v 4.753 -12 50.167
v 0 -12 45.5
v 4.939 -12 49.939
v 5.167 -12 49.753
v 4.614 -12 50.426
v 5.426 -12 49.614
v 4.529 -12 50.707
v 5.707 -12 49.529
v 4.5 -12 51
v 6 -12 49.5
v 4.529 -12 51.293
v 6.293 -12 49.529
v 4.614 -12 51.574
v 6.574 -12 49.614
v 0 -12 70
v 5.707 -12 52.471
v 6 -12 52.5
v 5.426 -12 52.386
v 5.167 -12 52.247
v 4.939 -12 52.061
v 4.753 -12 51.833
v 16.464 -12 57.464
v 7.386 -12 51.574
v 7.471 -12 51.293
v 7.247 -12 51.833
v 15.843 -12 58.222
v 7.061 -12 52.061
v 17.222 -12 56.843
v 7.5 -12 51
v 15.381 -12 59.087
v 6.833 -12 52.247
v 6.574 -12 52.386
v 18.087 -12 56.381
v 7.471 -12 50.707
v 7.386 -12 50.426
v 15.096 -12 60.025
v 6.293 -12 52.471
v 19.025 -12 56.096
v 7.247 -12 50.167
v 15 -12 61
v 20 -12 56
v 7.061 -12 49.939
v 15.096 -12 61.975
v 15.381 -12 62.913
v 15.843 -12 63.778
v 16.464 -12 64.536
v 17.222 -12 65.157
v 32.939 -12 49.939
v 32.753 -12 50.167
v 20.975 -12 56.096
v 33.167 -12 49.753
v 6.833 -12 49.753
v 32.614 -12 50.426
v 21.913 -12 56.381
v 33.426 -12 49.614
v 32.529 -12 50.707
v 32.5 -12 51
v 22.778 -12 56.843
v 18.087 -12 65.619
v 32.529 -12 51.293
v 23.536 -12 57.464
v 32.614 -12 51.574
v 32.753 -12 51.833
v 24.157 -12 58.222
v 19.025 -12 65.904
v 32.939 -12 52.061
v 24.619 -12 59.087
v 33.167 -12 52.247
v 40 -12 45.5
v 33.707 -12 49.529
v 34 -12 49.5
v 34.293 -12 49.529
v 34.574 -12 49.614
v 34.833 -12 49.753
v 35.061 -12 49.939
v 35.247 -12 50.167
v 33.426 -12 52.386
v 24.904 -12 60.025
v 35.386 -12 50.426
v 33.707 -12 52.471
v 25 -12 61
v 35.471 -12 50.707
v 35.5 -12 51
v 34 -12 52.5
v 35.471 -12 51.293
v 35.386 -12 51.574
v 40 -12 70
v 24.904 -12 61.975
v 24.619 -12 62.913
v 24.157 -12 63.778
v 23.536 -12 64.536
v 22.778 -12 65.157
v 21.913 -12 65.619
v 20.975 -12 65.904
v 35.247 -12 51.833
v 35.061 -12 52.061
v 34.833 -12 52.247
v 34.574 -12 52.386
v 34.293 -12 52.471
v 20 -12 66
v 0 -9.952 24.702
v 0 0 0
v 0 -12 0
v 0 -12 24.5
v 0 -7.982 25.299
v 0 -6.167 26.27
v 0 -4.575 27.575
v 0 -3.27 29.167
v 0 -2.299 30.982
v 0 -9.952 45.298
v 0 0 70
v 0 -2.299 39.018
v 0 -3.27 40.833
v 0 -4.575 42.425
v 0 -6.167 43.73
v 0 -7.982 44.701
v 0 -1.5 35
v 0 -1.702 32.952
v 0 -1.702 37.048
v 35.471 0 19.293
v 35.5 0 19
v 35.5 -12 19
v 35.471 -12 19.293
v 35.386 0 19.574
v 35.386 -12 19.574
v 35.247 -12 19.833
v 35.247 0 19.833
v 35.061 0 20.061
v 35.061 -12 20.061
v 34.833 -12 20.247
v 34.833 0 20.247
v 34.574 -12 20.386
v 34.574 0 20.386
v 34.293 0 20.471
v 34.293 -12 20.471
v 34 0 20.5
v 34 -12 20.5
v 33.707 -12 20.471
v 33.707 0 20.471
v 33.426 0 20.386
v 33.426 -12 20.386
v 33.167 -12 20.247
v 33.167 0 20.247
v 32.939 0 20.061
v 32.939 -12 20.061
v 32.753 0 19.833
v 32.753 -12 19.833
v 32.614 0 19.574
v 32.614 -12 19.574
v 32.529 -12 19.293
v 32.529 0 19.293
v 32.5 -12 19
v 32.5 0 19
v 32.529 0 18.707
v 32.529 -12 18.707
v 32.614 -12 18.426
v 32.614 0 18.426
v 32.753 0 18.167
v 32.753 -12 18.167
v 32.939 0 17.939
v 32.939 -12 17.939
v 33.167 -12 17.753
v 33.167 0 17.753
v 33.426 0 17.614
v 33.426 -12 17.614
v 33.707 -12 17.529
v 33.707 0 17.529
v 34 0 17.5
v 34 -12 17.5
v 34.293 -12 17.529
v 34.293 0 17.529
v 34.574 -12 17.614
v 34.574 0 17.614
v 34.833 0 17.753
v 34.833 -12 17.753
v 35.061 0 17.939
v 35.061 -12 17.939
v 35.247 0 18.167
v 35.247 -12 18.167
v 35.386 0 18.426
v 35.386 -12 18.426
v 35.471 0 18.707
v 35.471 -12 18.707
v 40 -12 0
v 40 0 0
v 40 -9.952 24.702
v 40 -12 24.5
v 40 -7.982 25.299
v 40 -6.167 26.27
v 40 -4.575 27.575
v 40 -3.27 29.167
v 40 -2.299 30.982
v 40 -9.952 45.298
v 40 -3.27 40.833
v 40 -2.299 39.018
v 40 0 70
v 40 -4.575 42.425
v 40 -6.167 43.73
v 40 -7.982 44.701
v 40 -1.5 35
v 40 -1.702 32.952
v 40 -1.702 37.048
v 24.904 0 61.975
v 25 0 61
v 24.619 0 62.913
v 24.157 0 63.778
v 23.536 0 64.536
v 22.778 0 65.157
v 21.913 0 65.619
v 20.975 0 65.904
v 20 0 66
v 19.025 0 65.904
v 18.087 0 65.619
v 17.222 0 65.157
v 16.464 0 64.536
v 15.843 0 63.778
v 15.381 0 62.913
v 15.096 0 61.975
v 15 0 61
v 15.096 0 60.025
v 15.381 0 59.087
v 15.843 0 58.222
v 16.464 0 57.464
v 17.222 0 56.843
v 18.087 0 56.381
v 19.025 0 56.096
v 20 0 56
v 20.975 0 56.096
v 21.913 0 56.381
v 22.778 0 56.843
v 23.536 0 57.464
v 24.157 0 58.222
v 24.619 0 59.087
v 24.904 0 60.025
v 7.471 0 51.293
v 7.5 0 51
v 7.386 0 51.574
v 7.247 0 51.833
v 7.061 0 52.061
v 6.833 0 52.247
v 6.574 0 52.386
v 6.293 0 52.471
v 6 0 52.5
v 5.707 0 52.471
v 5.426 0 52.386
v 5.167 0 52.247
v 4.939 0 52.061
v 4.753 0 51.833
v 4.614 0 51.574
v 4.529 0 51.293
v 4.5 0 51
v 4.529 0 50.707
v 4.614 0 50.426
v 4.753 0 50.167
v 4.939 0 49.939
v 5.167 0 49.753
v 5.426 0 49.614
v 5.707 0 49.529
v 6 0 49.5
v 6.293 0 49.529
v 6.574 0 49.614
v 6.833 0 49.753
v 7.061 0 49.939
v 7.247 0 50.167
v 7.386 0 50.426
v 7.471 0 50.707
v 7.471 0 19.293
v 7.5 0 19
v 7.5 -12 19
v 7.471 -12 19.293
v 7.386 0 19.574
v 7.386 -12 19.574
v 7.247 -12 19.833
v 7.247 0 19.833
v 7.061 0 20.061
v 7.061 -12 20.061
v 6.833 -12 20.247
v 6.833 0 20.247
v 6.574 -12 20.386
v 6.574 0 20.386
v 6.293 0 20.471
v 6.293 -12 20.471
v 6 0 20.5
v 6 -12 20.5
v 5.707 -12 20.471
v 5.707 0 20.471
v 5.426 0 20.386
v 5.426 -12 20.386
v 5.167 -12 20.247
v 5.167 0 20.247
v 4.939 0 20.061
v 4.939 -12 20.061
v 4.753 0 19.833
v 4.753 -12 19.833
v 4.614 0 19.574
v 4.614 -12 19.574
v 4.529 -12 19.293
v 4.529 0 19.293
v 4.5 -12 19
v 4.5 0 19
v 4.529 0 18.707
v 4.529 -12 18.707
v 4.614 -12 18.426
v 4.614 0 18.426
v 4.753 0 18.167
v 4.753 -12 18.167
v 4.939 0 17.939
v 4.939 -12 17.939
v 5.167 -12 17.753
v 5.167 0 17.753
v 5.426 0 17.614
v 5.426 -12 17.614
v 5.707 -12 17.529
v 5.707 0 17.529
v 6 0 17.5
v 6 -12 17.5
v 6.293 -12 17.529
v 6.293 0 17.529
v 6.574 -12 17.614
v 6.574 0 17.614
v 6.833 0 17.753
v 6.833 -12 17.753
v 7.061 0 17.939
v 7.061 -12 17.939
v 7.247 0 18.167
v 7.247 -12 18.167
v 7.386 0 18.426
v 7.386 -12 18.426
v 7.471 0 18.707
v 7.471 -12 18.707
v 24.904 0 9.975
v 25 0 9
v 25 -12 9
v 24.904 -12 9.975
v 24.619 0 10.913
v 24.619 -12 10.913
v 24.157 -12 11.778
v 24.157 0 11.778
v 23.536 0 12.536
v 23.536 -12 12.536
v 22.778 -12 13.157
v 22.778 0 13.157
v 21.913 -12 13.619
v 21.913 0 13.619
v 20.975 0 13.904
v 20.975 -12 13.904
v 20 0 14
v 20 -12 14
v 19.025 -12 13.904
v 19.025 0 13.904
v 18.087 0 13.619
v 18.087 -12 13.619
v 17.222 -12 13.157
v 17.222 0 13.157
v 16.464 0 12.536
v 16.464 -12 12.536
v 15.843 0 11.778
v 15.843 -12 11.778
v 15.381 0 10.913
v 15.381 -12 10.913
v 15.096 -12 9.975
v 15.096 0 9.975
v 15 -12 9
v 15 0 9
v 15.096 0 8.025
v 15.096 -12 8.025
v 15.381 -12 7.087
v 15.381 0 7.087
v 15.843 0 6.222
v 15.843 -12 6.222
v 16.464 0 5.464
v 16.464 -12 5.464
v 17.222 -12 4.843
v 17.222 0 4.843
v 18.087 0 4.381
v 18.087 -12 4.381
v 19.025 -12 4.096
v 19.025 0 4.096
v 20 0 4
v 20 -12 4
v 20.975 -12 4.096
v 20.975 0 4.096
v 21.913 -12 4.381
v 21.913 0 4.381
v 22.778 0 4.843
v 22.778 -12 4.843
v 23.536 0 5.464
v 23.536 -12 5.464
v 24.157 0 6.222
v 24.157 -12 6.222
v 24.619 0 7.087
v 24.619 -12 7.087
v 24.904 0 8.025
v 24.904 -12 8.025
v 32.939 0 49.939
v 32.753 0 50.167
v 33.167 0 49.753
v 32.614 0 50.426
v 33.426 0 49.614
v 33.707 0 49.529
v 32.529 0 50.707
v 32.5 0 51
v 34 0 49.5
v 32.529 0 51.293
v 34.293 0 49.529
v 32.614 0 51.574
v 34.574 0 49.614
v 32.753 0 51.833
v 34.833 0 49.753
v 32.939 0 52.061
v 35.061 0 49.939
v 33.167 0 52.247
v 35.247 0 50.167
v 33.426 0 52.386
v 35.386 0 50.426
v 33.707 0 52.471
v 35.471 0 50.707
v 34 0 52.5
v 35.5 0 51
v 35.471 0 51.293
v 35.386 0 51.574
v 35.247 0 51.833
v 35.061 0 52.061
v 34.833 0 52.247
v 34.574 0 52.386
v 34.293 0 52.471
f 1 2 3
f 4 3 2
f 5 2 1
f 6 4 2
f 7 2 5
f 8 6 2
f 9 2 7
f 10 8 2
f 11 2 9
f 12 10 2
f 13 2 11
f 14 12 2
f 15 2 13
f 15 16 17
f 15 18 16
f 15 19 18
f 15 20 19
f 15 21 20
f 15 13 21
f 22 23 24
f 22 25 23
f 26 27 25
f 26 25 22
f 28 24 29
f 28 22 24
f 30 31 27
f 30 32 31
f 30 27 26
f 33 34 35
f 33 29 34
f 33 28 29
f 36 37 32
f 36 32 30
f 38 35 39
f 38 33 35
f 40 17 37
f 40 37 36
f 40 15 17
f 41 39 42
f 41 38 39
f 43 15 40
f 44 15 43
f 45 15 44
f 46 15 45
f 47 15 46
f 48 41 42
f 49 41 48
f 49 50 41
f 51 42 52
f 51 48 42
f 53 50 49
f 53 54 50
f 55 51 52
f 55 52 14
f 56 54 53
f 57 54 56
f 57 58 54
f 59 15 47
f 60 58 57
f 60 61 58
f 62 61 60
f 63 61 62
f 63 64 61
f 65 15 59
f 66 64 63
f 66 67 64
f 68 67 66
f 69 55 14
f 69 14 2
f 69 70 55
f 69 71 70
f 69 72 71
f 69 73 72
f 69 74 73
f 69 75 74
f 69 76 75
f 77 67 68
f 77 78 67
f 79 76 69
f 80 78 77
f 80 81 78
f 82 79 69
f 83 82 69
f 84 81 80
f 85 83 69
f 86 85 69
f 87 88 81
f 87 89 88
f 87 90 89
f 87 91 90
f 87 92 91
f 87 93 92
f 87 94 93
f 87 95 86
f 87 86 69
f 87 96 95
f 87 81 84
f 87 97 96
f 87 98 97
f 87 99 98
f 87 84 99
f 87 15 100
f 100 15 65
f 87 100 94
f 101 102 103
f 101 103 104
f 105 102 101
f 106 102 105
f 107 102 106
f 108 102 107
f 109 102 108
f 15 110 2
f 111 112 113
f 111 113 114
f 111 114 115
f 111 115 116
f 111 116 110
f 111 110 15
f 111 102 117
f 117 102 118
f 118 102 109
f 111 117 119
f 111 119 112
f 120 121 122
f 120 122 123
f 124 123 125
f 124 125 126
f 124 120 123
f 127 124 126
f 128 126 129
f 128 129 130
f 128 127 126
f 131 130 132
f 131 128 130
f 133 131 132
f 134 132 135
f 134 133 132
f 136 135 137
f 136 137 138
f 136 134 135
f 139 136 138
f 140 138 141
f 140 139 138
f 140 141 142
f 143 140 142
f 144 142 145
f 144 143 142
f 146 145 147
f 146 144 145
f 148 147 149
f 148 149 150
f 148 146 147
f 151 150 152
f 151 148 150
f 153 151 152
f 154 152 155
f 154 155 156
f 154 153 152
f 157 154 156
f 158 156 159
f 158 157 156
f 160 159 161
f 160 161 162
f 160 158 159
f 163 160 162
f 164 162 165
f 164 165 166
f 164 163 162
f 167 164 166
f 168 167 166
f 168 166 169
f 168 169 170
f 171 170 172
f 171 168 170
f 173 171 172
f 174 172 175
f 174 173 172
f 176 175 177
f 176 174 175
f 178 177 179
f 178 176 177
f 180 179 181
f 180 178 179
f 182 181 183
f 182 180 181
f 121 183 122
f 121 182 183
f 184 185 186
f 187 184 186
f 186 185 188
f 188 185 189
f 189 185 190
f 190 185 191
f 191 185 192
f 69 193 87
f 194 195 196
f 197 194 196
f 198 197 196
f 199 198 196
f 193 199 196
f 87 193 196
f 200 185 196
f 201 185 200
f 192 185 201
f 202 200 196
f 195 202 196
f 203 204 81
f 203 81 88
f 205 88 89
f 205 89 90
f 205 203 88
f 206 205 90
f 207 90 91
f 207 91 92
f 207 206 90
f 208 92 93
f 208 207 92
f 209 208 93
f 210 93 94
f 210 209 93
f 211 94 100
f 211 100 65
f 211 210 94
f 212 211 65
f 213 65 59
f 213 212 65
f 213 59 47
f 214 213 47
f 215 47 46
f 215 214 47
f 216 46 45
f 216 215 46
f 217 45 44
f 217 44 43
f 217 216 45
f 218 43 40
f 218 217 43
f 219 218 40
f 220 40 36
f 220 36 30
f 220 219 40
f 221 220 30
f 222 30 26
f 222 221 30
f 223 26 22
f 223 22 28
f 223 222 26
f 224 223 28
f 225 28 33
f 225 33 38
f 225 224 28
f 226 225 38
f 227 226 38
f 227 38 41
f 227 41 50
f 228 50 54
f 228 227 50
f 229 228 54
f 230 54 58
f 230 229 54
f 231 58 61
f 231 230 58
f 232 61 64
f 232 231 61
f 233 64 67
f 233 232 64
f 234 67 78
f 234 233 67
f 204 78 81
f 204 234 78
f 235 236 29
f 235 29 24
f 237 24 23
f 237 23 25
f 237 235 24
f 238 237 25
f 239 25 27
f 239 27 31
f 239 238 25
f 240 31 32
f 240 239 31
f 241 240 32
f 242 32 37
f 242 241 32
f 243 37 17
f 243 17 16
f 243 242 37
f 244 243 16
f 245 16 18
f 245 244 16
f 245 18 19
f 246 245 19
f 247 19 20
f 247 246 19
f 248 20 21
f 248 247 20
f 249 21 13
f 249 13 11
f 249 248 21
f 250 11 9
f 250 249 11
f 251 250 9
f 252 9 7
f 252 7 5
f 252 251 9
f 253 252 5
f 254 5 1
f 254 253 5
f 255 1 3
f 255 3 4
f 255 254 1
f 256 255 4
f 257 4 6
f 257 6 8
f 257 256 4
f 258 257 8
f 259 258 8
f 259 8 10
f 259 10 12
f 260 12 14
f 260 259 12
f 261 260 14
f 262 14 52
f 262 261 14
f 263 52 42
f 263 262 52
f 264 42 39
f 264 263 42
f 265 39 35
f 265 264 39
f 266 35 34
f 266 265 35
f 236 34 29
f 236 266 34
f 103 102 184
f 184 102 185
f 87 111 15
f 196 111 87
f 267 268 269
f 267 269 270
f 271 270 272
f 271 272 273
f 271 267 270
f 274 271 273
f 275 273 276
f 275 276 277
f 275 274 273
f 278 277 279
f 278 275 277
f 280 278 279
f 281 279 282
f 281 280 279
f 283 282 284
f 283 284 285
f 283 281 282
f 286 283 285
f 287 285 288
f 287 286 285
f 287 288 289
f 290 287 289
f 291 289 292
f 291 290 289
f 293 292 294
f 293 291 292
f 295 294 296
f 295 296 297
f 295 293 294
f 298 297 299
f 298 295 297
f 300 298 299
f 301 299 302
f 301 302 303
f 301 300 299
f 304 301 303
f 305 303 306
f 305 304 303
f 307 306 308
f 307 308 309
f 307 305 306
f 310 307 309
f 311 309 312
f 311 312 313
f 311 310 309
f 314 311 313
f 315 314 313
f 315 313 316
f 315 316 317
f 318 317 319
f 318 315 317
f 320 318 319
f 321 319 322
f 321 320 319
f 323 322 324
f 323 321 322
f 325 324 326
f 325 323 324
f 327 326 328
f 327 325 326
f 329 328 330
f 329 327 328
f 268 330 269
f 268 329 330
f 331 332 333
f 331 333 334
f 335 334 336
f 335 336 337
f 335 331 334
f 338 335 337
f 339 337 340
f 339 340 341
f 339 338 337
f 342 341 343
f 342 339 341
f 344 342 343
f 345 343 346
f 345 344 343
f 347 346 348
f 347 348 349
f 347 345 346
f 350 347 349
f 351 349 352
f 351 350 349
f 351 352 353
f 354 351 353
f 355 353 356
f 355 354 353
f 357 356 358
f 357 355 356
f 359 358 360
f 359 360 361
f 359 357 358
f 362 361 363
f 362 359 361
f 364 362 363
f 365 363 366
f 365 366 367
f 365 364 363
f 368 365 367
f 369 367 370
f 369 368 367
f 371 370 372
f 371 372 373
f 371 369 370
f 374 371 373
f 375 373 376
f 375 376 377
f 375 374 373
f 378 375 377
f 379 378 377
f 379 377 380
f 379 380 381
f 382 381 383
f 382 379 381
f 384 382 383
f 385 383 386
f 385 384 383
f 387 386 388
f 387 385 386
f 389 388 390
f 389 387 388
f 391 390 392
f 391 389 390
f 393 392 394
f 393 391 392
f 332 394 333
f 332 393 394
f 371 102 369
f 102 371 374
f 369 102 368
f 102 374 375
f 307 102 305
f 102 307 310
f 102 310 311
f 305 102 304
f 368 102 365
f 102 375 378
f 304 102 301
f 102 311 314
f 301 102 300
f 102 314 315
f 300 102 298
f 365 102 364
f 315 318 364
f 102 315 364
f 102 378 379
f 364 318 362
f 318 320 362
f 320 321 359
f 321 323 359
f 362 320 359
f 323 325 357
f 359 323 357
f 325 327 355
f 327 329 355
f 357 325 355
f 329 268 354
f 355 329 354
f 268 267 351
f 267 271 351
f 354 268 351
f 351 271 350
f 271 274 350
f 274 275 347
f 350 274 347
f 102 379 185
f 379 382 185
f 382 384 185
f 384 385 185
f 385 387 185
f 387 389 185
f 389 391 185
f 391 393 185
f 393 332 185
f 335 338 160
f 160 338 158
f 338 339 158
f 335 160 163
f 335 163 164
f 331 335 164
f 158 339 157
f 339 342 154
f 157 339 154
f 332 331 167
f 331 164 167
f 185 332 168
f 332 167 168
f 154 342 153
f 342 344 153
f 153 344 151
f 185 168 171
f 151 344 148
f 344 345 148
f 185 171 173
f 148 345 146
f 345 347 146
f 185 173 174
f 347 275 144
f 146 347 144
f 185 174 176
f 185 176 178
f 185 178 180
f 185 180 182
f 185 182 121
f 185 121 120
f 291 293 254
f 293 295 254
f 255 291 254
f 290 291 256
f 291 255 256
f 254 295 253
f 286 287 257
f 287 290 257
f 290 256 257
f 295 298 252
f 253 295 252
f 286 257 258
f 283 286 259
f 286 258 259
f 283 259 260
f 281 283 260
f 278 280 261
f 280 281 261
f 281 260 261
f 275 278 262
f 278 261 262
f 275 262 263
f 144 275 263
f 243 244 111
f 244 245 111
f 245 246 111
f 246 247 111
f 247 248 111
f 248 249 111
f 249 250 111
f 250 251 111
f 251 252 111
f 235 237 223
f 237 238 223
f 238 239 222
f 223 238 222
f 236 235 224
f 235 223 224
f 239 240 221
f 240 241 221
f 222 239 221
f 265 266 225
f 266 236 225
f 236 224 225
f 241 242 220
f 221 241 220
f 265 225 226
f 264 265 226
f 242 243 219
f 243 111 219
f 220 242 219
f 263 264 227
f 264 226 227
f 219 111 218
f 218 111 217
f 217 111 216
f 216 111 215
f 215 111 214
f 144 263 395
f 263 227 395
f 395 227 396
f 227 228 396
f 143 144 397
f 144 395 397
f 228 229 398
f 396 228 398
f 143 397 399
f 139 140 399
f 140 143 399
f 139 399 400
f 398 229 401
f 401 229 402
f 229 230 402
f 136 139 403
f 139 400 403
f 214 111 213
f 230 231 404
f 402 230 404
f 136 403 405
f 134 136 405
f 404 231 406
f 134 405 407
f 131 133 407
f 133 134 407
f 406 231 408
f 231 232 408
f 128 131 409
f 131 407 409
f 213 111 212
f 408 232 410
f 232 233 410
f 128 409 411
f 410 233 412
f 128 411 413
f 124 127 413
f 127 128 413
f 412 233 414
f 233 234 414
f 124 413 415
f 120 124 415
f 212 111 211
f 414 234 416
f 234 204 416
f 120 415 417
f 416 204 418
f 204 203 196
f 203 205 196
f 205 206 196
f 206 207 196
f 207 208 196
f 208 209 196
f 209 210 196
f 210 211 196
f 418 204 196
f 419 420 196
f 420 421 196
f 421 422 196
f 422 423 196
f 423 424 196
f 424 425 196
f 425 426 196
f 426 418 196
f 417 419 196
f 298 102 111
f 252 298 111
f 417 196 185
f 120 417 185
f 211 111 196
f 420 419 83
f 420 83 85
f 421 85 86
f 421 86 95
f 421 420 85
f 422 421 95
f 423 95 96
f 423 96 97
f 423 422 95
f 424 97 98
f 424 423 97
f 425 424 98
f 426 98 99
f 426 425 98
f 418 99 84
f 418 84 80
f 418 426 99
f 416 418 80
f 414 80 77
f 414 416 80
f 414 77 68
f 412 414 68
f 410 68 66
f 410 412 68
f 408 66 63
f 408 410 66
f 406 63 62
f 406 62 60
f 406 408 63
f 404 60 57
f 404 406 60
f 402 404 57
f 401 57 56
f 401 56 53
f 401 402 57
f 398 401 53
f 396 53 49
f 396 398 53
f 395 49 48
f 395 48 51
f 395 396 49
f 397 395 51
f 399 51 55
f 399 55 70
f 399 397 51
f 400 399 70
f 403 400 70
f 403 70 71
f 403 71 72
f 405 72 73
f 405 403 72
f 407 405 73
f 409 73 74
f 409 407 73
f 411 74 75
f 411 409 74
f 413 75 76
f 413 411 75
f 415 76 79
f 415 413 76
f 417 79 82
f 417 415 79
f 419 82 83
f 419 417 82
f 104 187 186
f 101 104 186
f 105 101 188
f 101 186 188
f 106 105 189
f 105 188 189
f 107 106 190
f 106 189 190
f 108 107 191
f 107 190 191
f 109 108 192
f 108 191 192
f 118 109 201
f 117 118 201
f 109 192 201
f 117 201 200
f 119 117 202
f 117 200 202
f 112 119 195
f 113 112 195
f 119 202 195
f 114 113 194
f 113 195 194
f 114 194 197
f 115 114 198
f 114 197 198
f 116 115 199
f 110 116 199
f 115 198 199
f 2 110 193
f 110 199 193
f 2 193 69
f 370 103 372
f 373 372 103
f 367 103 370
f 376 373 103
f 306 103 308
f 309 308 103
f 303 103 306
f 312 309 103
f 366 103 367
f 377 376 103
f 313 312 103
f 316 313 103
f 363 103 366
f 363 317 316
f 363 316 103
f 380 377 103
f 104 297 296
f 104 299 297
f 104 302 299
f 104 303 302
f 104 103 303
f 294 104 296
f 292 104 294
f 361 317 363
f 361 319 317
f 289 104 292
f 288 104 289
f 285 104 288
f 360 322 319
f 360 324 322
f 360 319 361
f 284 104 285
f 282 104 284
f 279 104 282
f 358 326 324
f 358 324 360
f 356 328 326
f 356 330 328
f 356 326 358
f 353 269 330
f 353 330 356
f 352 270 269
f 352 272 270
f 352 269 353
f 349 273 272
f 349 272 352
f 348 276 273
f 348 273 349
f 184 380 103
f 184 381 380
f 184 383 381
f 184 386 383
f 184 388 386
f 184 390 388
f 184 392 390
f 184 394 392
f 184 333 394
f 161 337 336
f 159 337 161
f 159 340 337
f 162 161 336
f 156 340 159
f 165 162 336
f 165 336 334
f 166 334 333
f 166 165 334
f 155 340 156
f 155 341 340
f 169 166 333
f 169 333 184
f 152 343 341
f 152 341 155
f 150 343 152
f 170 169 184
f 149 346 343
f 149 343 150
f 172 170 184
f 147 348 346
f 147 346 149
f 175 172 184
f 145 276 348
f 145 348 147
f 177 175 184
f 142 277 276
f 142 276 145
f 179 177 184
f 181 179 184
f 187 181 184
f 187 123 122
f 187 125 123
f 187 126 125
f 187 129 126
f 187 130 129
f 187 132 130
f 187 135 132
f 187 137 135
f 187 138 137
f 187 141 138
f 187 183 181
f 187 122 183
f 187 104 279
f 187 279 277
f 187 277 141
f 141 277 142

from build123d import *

# Parameters (mm, degrees)
F0_W     = 40
F0_H     = 70
F0_R     = 1.5
F0_R_2   = 5
F1_DEPTH = 12
F3_DEPTH = 40.001


with BuildPart() as f1:
    # F0 (on Front) → F1 (new body)
    with BuildSketch(Plane.XZ):
        with Locations((20, 35)):
            Rectangle(F0_W, F0_H)
        with Locations((6, 19)):
            Circle(F0_R, mode=Mode.SUBTRACT)
        with Locations((20, 9)):
            Circle(F0_R_2, mode=Mode.SUBTRACT)
        with Locations((34, 19)):
            Circle(F0_R, mode=Mode.SUBTRACT)
        with Locations((6, 51)):
            Circle(F0_R, mode=Mode.SUBTRACT)
        with Locations((34, 51)):
            Circle(F0_R, mode=Mode.SUBTRACT)
        with Locations((20, 61)):
            Circle(F0_R_2, mode=Mode.SUBTRACT)
    extrude(amount=F1_DEPTH)

    # F2 (on face) → F3 (cut, through all)
    with BuildSketch(Plane.YZ.offset(40)):
        with BuildLine():
            ThreePointArc((-12, 24.5), (-1.5, 35), (-12, 45.5))
            Line((-12, 45.5), (-12, 24.5))
        make_face()
    extrude(amount=-F3_DEPTH, mode=Mode.SUBTRACT)


solid = f1.part
